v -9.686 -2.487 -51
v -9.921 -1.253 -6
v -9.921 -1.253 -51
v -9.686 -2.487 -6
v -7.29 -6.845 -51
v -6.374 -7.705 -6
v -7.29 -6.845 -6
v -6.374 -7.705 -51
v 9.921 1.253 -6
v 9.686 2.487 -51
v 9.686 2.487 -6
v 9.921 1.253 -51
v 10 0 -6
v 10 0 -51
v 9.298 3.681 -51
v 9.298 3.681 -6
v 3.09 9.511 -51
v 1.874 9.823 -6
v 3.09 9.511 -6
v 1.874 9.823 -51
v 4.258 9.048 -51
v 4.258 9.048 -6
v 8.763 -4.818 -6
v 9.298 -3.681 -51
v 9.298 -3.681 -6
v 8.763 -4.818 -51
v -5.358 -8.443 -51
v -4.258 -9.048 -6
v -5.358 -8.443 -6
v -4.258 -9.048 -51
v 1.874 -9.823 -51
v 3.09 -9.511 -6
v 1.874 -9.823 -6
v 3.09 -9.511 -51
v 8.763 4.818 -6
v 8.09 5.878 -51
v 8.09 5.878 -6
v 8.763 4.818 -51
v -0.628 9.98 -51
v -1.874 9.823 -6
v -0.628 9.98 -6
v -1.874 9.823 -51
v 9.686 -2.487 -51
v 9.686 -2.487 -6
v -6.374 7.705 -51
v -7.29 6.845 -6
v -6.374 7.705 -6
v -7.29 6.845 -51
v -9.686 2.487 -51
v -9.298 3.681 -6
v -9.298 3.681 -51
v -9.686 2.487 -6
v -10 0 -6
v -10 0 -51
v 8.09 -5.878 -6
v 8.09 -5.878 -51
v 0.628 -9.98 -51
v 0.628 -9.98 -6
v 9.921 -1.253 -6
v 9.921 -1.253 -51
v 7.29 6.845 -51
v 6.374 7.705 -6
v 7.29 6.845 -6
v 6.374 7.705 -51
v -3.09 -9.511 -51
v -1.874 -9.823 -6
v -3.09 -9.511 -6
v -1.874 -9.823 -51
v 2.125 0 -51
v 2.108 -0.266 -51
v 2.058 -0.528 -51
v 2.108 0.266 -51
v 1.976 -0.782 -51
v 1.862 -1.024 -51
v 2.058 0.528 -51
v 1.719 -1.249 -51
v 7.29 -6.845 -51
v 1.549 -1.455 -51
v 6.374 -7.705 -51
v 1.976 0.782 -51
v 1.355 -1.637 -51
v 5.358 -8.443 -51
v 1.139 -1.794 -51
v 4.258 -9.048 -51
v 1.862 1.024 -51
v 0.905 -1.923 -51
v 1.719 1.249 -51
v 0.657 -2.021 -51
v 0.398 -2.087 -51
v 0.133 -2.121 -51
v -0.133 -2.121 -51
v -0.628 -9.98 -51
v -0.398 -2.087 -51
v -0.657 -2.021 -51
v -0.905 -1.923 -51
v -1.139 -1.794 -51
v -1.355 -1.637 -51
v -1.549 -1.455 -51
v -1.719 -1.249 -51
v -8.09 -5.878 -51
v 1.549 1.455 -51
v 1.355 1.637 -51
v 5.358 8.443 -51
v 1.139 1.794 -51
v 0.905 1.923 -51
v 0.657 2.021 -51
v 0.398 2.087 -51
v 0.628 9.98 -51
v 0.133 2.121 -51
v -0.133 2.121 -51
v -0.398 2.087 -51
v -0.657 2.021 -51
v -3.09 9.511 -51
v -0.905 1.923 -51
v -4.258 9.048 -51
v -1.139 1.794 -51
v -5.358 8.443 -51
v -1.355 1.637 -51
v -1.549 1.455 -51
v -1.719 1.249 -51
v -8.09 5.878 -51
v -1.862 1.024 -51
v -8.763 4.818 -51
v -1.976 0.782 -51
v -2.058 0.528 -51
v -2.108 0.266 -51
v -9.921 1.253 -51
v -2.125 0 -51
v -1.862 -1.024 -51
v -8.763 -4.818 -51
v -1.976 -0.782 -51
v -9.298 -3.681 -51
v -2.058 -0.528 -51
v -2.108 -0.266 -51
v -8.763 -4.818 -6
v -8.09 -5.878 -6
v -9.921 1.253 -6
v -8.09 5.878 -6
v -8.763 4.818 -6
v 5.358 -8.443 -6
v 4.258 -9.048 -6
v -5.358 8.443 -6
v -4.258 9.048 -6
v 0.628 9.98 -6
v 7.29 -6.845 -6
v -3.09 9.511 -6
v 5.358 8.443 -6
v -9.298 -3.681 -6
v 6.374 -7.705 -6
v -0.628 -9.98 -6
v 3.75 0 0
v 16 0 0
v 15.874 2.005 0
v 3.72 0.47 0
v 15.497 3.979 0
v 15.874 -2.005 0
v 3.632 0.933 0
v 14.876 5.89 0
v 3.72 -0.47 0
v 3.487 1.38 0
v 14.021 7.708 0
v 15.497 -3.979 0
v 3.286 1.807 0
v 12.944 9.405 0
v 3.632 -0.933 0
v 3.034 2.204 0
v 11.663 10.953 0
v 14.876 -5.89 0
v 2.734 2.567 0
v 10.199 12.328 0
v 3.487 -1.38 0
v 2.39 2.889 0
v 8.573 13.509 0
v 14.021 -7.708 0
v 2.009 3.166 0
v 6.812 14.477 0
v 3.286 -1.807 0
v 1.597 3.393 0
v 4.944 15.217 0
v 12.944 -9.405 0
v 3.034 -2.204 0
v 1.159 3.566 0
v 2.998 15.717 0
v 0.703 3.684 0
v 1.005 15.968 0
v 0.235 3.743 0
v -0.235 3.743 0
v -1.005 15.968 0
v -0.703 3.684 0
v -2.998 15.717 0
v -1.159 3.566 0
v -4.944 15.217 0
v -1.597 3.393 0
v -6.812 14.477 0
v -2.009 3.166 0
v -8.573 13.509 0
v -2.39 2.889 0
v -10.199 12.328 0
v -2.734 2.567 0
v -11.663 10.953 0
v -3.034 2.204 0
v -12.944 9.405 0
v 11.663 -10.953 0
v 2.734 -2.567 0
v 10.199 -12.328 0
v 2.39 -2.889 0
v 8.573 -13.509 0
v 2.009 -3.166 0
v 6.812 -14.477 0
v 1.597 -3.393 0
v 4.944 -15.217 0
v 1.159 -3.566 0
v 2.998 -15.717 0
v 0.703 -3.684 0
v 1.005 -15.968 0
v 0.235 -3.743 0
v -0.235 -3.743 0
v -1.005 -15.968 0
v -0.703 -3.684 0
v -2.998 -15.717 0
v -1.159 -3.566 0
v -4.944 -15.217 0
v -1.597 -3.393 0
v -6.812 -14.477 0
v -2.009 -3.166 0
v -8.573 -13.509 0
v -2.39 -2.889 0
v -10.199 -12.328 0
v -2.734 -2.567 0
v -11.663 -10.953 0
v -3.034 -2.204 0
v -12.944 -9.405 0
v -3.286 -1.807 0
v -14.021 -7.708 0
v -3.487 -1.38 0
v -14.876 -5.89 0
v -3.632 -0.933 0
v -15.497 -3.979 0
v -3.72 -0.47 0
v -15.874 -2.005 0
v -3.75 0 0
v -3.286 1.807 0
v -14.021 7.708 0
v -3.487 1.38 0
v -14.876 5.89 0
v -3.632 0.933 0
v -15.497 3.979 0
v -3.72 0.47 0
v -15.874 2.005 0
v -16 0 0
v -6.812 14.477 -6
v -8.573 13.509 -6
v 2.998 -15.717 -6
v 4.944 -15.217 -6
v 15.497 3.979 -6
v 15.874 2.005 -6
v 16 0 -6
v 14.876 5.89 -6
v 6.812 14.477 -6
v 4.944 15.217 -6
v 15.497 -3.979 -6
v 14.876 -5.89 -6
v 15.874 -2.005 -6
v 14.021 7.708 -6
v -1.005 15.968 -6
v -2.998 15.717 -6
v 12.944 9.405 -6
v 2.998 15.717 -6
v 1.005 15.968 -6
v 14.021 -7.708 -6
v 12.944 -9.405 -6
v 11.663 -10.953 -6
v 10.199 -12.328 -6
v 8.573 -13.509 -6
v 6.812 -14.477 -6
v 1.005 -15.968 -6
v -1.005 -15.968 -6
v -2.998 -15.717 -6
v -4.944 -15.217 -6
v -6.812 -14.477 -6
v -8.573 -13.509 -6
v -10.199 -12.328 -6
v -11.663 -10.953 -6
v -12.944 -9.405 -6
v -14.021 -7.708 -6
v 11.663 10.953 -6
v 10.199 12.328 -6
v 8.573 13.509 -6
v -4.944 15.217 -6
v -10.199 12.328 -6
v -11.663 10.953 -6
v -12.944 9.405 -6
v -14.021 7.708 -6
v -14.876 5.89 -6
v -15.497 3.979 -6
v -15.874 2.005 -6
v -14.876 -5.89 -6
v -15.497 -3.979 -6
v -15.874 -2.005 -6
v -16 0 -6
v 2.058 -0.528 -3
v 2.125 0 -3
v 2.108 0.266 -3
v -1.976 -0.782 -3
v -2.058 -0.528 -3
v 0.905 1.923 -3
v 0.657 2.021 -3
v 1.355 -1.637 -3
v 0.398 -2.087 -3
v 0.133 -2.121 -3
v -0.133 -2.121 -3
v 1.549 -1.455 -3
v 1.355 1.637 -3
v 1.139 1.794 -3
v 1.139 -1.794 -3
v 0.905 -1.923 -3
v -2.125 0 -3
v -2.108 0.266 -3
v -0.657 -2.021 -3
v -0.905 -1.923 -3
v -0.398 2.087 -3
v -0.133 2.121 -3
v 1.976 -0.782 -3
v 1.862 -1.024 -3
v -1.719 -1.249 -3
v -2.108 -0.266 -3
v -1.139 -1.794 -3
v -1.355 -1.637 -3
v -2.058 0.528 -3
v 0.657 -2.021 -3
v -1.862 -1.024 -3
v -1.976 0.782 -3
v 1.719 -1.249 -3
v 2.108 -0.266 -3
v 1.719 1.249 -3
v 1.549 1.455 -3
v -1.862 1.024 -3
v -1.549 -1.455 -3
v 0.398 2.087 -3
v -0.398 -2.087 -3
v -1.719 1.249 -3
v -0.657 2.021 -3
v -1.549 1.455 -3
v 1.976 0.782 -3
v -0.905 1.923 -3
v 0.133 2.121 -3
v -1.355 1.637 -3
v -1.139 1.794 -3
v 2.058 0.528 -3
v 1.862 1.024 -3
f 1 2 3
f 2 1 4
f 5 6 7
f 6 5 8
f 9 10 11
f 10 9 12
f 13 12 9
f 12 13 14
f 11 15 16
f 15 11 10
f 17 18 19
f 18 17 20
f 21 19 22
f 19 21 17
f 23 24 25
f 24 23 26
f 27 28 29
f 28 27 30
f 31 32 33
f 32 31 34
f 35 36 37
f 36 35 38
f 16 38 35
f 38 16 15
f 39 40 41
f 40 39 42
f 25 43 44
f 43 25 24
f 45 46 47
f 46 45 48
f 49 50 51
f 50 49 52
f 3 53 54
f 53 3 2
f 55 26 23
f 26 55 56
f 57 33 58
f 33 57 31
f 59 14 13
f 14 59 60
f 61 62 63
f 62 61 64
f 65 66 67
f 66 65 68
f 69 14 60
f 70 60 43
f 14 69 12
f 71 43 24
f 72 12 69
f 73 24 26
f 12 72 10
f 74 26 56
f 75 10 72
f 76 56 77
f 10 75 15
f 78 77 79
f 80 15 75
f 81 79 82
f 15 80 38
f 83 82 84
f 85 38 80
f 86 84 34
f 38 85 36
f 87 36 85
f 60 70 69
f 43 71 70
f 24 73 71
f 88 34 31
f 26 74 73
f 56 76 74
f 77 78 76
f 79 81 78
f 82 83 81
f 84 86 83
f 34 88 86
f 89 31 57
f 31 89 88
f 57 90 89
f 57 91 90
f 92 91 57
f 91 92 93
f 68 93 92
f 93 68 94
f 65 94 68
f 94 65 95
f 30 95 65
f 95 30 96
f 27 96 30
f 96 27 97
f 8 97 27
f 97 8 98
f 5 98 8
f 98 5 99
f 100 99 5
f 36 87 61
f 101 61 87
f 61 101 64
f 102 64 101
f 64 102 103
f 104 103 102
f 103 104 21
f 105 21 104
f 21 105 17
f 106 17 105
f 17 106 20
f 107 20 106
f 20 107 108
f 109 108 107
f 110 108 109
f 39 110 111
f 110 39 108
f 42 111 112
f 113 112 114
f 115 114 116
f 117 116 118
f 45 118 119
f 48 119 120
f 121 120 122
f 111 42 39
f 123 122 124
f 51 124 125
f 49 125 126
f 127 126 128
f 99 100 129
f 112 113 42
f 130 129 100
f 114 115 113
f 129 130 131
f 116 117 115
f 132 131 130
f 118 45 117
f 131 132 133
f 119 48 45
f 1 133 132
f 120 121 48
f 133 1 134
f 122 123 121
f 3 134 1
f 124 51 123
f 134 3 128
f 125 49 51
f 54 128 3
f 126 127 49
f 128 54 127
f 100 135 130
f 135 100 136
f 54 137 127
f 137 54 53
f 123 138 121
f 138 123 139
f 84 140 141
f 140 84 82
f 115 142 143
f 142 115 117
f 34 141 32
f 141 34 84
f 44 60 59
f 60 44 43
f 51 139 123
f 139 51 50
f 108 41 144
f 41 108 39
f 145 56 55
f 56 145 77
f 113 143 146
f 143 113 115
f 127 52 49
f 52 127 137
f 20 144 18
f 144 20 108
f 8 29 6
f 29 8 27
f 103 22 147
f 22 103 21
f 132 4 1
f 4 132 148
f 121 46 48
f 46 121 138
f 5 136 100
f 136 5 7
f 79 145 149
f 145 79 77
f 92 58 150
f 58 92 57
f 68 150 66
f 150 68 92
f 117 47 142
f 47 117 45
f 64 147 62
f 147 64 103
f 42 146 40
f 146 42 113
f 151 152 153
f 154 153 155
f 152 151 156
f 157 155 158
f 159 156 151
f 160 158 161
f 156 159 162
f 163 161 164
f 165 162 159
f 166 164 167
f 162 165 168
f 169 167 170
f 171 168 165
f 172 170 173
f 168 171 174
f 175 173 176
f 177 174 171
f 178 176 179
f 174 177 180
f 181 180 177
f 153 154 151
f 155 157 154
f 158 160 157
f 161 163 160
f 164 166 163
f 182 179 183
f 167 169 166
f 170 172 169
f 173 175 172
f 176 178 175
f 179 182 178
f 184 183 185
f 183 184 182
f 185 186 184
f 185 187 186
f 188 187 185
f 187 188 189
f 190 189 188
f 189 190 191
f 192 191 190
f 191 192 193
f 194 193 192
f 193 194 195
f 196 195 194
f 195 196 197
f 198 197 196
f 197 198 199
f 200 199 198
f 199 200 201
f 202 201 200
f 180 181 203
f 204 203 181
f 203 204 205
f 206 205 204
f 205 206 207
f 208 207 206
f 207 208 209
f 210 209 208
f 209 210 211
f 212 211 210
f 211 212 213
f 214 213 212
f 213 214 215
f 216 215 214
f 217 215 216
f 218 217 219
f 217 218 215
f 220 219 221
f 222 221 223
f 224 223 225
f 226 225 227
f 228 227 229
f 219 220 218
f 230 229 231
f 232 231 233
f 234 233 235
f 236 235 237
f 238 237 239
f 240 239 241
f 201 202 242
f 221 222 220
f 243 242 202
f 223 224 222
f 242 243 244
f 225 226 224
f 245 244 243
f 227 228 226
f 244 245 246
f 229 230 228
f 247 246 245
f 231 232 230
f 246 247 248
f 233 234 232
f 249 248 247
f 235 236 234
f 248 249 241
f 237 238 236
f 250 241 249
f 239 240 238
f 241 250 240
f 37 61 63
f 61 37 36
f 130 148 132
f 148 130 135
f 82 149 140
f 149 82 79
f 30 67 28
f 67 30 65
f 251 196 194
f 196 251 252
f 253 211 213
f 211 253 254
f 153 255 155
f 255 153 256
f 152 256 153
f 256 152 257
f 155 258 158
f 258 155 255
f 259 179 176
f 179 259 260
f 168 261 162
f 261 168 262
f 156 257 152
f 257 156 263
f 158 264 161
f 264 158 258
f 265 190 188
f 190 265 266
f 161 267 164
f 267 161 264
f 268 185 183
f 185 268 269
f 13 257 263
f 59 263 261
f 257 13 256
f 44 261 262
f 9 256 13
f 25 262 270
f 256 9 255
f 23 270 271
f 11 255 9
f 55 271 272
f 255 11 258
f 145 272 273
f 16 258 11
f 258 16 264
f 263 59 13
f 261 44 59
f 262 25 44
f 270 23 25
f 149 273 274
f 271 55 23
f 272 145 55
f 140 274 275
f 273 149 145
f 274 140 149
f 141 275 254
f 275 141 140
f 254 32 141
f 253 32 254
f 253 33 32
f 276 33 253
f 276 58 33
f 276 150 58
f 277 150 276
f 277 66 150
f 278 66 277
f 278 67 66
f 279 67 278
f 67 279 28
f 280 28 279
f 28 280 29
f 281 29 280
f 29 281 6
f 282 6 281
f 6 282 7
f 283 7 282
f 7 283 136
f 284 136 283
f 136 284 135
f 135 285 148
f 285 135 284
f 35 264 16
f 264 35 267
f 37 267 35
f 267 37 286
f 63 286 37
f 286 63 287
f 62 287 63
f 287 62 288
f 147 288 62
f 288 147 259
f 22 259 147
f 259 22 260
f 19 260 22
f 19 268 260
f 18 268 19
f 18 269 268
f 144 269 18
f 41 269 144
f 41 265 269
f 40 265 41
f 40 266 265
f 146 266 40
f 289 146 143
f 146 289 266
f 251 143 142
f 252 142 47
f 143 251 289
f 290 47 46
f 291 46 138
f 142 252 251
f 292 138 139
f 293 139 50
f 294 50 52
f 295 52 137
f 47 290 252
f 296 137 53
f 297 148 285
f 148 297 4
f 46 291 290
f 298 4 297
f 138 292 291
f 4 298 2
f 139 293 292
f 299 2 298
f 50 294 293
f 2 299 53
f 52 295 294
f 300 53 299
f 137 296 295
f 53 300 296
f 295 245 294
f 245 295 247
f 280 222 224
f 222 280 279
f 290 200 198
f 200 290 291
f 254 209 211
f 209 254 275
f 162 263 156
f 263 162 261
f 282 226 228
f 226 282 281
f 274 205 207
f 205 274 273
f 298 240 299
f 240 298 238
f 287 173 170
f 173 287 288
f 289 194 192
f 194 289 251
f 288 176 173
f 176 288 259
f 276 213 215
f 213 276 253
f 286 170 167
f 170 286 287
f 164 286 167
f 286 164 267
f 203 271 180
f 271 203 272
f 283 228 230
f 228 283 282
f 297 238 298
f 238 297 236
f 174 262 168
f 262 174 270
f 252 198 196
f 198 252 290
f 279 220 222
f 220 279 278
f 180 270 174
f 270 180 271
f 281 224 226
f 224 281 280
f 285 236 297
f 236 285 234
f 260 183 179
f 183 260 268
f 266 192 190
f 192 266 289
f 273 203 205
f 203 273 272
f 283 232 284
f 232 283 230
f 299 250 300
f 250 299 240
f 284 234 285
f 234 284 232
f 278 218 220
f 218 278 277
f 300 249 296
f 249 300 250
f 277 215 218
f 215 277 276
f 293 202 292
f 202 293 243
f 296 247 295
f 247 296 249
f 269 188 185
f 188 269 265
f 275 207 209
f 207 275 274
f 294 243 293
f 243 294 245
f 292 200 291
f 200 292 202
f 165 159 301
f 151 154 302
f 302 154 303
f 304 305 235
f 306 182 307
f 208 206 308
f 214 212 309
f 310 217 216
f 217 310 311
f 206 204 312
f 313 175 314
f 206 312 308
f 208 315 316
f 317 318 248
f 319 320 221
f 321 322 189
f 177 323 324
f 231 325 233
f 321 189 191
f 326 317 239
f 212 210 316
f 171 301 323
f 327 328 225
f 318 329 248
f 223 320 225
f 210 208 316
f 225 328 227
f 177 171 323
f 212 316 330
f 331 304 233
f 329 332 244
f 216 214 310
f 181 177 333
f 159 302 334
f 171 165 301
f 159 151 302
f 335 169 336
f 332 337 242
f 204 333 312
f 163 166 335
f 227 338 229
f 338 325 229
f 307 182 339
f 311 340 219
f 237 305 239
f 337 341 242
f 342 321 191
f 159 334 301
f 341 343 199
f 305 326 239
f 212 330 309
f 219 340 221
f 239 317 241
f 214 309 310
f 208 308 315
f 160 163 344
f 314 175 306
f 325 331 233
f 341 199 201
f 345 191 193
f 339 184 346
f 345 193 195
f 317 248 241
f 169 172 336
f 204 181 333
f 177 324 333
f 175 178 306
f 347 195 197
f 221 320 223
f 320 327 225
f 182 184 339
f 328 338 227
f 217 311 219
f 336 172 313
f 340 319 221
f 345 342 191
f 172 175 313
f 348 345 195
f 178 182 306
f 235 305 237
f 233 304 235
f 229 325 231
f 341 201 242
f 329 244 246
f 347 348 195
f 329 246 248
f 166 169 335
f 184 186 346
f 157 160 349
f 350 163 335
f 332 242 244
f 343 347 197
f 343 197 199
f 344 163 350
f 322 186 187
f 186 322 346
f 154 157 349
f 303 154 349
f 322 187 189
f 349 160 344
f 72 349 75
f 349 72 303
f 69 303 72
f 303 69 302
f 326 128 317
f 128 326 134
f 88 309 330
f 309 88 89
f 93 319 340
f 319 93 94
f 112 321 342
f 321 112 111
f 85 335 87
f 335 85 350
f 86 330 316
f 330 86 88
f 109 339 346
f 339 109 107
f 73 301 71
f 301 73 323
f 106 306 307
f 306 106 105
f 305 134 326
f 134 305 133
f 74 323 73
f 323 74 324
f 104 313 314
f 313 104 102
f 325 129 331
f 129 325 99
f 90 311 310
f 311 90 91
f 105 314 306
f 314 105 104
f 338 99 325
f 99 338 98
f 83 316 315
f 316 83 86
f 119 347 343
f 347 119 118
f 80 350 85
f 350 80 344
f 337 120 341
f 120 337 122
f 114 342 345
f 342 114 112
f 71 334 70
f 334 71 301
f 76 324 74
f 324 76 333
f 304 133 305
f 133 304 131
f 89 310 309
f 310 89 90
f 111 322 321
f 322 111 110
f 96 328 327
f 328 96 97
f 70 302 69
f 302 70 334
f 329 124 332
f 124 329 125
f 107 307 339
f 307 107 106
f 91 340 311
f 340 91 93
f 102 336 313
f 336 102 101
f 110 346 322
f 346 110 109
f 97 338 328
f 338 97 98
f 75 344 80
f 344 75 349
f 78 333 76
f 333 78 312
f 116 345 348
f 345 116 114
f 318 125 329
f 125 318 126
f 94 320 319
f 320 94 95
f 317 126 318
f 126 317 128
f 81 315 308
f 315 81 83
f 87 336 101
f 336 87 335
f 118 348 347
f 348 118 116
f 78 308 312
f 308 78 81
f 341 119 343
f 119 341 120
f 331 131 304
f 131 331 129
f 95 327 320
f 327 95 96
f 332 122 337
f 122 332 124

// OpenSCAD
$fn = 50;


difference() {
	union() {
		translate(v = [0, 0, -51.0000000000]) {
			cylinder(h = 51, r = 10.0000000000);
		}
		translate(v = [0, 0, -6.0000000000]) {
			cylinder(h = 6, r = 16.0000000000);
		}
	}
	union() {
		translate(v = [0, 0, 0]) {
			rotate(a = [0, 0, 0]) {
				difference() {
					union() {
						#translate(v = [0, 0, -51.0000000000]) {
							cylinder(h = 51, r = 2.0000000000);
						}
						#translate(v = [0, 0, -3]) {
							cylinder(h = 3, r1 = 2.1250000000, r2 = 3.7500000000);
						}
						#translate(v = [0, 0, -51.0000000000]) {
							cylinder(h = 51, r = 2.1250000000);
						}
						#translate(v = [0, 0, -51.0000000000]) {
							cylinder(h = 51, r = 2.0000000000);
						}
					}
					union();
				}
			}
		}
	}
}
